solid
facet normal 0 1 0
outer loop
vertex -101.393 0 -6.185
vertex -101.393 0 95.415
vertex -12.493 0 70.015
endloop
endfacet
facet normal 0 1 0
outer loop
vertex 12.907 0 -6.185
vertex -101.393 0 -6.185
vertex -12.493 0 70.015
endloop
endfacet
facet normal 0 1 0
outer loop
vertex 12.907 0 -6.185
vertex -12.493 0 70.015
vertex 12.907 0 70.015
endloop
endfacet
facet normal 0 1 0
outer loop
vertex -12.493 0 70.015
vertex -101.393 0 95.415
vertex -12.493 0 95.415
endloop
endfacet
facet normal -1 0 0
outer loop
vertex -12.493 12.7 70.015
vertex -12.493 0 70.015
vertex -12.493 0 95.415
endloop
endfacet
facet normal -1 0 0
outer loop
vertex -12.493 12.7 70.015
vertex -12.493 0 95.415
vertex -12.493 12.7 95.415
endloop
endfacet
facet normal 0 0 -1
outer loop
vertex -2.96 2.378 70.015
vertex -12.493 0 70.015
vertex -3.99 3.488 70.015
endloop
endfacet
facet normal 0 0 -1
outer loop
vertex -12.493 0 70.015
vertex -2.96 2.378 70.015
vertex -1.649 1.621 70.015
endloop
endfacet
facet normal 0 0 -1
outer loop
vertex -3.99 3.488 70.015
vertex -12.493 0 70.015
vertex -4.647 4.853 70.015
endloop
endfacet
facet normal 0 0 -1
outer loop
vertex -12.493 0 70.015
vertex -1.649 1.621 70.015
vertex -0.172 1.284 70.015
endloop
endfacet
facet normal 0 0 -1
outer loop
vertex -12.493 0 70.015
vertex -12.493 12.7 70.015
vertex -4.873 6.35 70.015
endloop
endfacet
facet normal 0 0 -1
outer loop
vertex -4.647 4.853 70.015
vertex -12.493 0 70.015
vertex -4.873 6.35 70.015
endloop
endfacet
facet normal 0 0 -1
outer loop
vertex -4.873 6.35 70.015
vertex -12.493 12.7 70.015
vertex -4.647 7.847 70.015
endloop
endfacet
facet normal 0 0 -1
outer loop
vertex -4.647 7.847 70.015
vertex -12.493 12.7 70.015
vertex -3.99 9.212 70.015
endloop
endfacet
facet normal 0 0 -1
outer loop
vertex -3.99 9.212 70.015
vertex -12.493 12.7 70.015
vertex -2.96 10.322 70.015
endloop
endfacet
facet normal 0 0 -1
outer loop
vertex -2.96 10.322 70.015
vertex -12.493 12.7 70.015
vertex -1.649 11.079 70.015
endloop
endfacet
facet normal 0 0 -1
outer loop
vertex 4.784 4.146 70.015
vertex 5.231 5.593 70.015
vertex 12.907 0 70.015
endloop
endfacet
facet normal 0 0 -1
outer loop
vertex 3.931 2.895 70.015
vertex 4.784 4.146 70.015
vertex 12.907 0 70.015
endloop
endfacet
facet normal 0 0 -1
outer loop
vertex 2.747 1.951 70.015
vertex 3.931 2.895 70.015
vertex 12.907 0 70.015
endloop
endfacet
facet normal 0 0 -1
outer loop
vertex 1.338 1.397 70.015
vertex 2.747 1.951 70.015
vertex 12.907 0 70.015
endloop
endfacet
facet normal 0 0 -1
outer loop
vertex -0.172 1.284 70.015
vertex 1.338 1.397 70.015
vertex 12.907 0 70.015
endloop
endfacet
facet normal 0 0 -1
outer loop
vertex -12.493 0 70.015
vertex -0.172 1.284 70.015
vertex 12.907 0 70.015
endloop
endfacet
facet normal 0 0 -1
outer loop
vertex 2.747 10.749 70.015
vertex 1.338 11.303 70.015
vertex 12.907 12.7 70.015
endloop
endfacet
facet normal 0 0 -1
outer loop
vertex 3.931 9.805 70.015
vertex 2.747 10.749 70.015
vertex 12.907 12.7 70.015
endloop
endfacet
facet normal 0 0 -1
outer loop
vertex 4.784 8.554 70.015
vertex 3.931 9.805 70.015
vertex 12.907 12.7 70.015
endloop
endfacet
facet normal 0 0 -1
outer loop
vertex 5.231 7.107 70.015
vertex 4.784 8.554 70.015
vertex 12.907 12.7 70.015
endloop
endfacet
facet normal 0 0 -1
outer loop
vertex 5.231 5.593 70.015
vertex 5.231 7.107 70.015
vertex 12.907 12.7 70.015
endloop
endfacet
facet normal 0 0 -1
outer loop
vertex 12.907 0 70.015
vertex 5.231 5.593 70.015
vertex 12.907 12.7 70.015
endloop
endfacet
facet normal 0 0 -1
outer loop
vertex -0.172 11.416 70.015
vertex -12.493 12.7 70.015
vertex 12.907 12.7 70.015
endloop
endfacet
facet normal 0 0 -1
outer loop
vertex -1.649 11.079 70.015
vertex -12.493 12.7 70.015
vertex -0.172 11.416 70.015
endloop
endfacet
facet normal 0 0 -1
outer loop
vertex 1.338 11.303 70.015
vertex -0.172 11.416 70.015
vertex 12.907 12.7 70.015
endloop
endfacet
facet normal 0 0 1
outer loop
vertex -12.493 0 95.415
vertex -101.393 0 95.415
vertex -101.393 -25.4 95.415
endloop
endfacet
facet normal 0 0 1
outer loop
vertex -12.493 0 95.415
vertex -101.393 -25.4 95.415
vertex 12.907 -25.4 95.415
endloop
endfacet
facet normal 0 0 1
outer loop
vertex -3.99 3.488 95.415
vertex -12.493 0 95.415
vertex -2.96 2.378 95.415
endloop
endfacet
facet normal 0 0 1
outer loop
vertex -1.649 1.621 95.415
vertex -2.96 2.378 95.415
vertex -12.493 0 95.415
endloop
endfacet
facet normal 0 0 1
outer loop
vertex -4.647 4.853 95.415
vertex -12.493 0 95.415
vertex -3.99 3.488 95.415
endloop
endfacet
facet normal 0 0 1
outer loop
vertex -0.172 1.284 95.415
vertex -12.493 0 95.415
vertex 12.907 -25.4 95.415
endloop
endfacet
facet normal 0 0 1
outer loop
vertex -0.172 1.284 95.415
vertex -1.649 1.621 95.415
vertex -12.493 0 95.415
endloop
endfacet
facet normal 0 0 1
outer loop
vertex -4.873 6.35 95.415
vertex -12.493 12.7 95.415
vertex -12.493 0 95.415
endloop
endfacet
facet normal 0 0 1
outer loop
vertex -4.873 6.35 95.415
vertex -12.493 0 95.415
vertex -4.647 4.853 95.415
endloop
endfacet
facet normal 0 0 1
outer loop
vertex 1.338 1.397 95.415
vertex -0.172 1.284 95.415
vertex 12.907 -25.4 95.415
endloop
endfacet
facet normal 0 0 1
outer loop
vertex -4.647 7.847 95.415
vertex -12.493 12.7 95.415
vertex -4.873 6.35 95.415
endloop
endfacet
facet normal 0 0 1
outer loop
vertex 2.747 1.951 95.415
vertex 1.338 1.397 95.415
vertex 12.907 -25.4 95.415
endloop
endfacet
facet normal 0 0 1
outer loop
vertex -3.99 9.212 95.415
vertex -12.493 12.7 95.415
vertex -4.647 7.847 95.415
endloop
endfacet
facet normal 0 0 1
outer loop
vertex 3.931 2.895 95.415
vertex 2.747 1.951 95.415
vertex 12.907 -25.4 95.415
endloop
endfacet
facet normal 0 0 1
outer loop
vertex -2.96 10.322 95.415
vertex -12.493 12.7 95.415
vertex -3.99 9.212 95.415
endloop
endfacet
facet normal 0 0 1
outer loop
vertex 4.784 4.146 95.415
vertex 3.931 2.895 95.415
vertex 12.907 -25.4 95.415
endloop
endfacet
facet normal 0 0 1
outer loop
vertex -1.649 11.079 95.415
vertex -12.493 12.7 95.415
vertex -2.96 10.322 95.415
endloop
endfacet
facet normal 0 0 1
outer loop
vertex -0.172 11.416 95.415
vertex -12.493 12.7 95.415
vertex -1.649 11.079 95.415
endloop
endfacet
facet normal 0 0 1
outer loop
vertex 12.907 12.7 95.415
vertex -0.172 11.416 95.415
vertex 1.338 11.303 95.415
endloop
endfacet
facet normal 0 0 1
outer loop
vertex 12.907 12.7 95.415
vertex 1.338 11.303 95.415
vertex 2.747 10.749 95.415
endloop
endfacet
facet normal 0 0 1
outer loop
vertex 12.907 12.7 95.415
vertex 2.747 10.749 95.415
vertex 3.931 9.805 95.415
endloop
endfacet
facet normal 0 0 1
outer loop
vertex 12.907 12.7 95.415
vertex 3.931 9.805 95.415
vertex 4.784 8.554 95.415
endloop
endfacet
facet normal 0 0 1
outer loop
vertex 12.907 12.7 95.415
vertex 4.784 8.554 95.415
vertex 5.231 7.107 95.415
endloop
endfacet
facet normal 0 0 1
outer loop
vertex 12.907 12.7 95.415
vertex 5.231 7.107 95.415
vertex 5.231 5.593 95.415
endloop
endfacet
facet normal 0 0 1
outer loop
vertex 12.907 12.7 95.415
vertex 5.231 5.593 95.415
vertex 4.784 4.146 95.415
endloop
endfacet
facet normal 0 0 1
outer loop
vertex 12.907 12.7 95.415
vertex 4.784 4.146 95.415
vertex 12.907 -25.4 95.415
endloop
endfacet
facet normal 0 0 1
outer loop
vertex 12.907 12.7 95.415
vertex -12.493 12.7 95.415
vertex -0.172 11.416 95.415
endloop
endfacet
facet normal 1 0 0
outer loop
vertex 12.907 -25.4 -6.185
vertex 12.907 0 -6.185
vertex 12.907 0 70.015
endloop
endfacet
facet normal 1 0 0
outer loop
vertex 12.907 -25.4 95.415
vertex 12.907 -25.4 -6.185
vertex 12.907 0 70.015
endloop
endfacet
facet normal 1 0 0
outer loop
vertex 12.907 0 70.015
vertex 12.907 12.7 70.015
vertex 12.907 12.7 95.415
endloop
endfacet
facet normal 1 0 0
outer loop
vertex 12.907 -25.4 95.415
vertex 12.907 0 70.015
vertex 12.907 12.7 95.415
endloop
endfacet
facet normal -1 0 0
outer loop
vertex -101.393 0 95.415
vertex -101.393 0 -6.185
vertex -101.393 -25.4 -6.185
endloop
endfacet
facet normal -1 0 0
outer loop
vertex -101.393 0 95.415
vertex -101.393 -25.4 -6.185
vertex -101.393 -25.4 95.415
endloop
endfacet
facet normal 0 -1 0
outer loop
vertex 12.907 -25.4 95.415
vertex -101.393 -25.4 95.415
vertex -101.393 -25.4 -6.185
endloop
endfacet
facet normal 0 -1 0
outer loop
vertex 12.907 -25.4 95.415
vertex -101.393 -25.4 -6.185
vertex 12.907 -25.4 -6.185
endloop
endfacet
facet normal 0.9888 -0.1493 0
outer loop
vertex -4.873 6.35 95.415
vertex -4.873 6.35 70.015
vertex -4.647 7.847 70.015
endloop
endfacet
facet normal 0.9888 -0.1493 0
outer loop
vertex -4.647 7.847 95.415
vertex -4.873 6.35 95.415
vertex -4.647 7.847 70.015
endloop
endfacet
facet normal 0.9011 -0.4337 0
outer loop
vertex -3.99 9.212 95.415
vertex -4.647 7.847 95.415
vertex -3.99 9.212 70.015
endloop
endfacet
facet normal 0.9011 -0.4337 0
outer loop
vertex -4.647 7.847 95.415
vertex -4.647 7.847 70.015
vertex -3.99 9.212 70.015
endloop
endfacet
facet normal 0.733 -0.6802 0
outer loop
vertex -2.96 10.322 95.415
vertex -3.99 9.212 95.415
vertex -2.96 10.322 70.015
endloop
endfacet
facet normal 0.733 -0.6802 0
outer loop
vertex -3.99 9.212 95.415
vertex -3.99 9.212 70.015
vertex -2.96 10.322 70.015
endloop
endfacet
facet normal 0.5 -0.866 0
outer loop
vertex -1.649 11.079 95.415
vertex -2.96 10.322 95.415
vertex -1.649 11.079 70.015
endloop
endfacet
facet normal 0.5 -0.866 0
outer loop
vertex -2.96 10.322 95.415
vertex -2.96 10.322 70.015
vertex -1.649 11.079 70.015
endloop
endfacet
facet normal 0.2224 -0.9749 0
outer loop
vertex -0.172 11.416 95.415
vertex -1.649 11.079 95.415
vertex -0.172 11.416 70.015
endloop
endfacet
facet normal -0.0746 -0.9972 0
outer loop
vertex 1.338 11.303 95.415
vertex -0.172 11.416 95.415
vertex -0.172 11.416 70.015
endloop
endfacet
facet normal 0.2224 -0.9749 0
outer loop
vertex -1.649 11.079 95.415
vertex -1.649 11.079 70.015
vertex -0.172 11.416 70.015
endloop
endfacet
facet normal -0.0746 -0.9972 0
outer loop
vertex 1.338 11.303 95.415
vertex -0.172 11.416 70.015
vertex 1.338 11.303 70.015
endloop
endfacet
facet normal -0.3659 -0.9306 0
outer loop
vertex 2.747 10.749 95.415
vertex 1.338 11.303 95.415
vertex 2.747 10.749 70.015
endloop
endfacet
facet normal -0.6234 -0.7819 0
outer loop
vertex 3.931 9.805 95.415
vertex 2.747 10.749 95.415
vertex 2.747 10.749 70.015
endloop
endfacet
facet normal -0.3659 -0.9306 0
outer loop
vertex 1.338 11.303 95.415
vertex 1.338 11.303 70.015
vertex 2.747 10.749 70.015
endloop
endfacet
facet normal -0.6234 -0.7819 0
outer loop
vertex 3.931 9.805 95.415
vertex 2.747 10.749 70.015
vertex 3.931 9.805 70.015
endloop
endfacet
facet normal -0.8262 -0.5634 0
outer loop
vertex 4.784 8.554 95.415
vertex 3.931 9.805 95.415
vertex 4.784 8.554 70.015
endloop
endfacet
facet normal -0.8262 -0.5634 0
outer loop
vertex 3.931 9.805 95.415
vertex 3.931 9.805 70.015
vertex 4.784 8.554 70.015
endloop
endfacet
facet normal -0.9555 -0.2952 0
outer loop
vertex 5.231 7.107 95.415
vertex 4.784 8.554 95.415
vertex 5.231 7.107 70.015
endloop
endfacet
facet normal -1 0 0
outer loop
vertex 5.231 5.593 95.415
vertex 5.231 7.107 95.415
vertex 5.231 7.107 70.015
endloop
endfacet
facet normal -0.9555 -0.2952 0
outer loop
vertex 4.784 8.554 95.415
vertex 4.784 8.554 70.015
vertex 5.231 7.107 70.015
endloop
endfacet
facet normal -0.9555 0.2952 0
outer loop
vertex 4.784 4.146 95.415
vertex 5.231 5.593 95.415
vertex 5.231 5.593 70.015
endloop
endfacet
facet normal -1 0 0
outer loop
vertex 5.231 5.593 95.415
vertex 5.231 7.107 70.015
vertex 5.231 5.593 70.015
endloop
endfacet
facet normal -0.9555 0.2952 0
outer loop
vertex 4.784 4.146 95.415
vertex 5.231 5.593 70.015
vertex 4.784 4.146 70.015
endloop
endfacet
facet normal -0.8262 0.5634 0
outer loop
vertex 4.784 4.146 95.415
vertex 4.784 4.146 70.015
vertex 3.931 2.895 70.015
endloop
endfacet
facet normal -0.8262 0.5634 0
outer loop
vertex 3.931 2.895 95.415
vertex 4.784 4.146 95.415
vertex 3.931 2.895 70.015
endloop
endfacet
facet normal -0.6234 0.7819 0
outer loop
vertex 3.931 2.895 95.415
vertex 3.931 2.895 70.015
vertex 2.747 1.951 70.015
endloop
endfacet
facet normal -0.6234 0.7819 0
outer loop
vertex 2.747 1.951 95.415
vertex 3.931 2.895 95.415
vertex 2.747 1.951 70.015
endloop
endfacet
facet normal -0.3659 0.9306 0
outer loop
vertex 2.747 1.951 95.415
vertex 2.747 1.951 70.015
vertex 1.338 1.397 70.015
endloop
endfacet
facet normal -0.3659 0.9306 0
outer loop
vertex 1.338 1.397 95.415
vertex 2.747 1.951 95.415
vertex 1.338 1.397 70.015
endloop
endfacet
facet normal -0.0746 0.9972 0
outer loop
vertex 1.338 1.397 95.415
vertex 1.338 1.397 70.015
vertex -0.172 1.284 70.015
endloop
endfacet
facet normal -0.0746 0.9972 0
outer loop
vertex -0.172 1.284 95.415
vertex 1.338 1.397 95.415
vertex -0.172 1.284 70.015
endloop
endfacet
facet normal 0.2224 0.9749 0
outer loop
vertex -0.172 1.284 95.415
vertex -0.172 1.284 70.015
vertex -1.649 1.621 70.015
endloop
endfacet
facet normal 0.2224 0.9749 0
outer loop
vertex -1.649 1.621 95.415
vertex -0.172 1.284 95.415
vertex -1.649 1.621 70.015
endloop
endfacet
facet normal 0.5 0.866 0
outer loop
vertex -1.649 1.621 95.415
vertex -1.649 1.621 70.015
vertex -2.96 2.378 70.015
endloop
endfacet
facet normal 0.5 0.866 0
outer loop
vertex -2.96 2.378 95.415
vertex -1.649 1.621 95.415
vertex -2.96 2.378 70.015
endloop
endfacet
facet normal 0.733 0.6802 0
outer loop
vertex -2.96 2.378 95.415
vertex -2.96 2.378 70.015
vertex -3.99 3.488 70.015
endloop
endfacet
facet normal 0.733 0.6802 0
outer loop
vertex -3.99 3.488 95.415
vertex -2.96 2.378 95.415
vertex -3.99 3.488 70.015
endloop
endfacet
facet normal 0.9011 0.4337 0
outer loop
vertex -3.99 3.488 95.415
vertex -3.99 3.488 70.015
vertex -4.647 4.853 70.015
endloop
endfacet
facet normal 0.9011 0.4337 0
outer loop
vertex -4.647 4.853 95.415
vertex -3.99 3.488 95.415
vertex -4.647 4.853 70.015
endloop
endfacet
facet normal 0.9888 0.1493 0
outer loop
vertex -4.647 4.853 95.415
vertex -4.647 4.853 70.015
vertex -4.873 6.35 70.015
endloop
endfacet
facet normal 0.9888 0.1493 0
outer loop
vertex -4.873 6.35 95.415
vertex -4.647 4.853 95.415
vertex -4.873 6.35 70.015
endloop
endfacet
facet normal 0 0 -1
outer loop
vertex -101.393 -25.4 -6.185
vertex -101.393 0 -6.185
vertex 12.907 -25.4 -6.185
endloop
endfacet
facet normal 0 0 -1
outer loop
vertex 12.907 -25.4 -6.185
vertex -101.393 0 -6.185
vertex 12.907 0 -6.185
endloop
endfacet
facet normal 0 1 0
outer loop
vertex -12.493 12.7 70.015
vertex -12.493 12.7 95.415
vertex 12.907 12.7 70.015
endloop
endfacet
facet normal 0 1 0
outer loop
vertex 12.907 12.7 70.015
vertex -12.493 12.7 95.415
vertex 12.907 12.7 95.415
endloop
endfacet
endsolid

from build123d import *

# Parameters (mm, degrees)
F0_W     = 114.3
F0_H     = 101.6
F1_DEPTH = 25.4
F2_W     = 25.4
F2_H     = 12.7
F3_DEPTH = 25.4
F7_D     = 10.16


# Not quite as in the source:
# - a feature of the source that left no trace in its solid (it failed there, or was rolled back) is left out


with BuildPart() as f1:
    # F0 (on Front) → F1 (new body)
    with BuildSketch(Plane.XZ):
        with Locations((-44.2425758362, 44.6146523613)):
            Rectangle(F0_W, F0_H)
    extrude(amount=F1_DEPTH)

    # F2 (on face) → F3 (join)
    with BuildSketch(Plane.XY.offset(95.4146523613)):
        with Locations((0.2074241638, 6.35)):
            Rectangle(F2_W, F2_H)
    extrude(amount=-F3_DEPTH)

    # F5: union 

    # F7 (through all)
    with Locations(Plane.XY.offset(95.4146523613)):
        with Locations((0.2074241638, 6.35)):
            Hole(F7_D / 2)


solid = f1.part
